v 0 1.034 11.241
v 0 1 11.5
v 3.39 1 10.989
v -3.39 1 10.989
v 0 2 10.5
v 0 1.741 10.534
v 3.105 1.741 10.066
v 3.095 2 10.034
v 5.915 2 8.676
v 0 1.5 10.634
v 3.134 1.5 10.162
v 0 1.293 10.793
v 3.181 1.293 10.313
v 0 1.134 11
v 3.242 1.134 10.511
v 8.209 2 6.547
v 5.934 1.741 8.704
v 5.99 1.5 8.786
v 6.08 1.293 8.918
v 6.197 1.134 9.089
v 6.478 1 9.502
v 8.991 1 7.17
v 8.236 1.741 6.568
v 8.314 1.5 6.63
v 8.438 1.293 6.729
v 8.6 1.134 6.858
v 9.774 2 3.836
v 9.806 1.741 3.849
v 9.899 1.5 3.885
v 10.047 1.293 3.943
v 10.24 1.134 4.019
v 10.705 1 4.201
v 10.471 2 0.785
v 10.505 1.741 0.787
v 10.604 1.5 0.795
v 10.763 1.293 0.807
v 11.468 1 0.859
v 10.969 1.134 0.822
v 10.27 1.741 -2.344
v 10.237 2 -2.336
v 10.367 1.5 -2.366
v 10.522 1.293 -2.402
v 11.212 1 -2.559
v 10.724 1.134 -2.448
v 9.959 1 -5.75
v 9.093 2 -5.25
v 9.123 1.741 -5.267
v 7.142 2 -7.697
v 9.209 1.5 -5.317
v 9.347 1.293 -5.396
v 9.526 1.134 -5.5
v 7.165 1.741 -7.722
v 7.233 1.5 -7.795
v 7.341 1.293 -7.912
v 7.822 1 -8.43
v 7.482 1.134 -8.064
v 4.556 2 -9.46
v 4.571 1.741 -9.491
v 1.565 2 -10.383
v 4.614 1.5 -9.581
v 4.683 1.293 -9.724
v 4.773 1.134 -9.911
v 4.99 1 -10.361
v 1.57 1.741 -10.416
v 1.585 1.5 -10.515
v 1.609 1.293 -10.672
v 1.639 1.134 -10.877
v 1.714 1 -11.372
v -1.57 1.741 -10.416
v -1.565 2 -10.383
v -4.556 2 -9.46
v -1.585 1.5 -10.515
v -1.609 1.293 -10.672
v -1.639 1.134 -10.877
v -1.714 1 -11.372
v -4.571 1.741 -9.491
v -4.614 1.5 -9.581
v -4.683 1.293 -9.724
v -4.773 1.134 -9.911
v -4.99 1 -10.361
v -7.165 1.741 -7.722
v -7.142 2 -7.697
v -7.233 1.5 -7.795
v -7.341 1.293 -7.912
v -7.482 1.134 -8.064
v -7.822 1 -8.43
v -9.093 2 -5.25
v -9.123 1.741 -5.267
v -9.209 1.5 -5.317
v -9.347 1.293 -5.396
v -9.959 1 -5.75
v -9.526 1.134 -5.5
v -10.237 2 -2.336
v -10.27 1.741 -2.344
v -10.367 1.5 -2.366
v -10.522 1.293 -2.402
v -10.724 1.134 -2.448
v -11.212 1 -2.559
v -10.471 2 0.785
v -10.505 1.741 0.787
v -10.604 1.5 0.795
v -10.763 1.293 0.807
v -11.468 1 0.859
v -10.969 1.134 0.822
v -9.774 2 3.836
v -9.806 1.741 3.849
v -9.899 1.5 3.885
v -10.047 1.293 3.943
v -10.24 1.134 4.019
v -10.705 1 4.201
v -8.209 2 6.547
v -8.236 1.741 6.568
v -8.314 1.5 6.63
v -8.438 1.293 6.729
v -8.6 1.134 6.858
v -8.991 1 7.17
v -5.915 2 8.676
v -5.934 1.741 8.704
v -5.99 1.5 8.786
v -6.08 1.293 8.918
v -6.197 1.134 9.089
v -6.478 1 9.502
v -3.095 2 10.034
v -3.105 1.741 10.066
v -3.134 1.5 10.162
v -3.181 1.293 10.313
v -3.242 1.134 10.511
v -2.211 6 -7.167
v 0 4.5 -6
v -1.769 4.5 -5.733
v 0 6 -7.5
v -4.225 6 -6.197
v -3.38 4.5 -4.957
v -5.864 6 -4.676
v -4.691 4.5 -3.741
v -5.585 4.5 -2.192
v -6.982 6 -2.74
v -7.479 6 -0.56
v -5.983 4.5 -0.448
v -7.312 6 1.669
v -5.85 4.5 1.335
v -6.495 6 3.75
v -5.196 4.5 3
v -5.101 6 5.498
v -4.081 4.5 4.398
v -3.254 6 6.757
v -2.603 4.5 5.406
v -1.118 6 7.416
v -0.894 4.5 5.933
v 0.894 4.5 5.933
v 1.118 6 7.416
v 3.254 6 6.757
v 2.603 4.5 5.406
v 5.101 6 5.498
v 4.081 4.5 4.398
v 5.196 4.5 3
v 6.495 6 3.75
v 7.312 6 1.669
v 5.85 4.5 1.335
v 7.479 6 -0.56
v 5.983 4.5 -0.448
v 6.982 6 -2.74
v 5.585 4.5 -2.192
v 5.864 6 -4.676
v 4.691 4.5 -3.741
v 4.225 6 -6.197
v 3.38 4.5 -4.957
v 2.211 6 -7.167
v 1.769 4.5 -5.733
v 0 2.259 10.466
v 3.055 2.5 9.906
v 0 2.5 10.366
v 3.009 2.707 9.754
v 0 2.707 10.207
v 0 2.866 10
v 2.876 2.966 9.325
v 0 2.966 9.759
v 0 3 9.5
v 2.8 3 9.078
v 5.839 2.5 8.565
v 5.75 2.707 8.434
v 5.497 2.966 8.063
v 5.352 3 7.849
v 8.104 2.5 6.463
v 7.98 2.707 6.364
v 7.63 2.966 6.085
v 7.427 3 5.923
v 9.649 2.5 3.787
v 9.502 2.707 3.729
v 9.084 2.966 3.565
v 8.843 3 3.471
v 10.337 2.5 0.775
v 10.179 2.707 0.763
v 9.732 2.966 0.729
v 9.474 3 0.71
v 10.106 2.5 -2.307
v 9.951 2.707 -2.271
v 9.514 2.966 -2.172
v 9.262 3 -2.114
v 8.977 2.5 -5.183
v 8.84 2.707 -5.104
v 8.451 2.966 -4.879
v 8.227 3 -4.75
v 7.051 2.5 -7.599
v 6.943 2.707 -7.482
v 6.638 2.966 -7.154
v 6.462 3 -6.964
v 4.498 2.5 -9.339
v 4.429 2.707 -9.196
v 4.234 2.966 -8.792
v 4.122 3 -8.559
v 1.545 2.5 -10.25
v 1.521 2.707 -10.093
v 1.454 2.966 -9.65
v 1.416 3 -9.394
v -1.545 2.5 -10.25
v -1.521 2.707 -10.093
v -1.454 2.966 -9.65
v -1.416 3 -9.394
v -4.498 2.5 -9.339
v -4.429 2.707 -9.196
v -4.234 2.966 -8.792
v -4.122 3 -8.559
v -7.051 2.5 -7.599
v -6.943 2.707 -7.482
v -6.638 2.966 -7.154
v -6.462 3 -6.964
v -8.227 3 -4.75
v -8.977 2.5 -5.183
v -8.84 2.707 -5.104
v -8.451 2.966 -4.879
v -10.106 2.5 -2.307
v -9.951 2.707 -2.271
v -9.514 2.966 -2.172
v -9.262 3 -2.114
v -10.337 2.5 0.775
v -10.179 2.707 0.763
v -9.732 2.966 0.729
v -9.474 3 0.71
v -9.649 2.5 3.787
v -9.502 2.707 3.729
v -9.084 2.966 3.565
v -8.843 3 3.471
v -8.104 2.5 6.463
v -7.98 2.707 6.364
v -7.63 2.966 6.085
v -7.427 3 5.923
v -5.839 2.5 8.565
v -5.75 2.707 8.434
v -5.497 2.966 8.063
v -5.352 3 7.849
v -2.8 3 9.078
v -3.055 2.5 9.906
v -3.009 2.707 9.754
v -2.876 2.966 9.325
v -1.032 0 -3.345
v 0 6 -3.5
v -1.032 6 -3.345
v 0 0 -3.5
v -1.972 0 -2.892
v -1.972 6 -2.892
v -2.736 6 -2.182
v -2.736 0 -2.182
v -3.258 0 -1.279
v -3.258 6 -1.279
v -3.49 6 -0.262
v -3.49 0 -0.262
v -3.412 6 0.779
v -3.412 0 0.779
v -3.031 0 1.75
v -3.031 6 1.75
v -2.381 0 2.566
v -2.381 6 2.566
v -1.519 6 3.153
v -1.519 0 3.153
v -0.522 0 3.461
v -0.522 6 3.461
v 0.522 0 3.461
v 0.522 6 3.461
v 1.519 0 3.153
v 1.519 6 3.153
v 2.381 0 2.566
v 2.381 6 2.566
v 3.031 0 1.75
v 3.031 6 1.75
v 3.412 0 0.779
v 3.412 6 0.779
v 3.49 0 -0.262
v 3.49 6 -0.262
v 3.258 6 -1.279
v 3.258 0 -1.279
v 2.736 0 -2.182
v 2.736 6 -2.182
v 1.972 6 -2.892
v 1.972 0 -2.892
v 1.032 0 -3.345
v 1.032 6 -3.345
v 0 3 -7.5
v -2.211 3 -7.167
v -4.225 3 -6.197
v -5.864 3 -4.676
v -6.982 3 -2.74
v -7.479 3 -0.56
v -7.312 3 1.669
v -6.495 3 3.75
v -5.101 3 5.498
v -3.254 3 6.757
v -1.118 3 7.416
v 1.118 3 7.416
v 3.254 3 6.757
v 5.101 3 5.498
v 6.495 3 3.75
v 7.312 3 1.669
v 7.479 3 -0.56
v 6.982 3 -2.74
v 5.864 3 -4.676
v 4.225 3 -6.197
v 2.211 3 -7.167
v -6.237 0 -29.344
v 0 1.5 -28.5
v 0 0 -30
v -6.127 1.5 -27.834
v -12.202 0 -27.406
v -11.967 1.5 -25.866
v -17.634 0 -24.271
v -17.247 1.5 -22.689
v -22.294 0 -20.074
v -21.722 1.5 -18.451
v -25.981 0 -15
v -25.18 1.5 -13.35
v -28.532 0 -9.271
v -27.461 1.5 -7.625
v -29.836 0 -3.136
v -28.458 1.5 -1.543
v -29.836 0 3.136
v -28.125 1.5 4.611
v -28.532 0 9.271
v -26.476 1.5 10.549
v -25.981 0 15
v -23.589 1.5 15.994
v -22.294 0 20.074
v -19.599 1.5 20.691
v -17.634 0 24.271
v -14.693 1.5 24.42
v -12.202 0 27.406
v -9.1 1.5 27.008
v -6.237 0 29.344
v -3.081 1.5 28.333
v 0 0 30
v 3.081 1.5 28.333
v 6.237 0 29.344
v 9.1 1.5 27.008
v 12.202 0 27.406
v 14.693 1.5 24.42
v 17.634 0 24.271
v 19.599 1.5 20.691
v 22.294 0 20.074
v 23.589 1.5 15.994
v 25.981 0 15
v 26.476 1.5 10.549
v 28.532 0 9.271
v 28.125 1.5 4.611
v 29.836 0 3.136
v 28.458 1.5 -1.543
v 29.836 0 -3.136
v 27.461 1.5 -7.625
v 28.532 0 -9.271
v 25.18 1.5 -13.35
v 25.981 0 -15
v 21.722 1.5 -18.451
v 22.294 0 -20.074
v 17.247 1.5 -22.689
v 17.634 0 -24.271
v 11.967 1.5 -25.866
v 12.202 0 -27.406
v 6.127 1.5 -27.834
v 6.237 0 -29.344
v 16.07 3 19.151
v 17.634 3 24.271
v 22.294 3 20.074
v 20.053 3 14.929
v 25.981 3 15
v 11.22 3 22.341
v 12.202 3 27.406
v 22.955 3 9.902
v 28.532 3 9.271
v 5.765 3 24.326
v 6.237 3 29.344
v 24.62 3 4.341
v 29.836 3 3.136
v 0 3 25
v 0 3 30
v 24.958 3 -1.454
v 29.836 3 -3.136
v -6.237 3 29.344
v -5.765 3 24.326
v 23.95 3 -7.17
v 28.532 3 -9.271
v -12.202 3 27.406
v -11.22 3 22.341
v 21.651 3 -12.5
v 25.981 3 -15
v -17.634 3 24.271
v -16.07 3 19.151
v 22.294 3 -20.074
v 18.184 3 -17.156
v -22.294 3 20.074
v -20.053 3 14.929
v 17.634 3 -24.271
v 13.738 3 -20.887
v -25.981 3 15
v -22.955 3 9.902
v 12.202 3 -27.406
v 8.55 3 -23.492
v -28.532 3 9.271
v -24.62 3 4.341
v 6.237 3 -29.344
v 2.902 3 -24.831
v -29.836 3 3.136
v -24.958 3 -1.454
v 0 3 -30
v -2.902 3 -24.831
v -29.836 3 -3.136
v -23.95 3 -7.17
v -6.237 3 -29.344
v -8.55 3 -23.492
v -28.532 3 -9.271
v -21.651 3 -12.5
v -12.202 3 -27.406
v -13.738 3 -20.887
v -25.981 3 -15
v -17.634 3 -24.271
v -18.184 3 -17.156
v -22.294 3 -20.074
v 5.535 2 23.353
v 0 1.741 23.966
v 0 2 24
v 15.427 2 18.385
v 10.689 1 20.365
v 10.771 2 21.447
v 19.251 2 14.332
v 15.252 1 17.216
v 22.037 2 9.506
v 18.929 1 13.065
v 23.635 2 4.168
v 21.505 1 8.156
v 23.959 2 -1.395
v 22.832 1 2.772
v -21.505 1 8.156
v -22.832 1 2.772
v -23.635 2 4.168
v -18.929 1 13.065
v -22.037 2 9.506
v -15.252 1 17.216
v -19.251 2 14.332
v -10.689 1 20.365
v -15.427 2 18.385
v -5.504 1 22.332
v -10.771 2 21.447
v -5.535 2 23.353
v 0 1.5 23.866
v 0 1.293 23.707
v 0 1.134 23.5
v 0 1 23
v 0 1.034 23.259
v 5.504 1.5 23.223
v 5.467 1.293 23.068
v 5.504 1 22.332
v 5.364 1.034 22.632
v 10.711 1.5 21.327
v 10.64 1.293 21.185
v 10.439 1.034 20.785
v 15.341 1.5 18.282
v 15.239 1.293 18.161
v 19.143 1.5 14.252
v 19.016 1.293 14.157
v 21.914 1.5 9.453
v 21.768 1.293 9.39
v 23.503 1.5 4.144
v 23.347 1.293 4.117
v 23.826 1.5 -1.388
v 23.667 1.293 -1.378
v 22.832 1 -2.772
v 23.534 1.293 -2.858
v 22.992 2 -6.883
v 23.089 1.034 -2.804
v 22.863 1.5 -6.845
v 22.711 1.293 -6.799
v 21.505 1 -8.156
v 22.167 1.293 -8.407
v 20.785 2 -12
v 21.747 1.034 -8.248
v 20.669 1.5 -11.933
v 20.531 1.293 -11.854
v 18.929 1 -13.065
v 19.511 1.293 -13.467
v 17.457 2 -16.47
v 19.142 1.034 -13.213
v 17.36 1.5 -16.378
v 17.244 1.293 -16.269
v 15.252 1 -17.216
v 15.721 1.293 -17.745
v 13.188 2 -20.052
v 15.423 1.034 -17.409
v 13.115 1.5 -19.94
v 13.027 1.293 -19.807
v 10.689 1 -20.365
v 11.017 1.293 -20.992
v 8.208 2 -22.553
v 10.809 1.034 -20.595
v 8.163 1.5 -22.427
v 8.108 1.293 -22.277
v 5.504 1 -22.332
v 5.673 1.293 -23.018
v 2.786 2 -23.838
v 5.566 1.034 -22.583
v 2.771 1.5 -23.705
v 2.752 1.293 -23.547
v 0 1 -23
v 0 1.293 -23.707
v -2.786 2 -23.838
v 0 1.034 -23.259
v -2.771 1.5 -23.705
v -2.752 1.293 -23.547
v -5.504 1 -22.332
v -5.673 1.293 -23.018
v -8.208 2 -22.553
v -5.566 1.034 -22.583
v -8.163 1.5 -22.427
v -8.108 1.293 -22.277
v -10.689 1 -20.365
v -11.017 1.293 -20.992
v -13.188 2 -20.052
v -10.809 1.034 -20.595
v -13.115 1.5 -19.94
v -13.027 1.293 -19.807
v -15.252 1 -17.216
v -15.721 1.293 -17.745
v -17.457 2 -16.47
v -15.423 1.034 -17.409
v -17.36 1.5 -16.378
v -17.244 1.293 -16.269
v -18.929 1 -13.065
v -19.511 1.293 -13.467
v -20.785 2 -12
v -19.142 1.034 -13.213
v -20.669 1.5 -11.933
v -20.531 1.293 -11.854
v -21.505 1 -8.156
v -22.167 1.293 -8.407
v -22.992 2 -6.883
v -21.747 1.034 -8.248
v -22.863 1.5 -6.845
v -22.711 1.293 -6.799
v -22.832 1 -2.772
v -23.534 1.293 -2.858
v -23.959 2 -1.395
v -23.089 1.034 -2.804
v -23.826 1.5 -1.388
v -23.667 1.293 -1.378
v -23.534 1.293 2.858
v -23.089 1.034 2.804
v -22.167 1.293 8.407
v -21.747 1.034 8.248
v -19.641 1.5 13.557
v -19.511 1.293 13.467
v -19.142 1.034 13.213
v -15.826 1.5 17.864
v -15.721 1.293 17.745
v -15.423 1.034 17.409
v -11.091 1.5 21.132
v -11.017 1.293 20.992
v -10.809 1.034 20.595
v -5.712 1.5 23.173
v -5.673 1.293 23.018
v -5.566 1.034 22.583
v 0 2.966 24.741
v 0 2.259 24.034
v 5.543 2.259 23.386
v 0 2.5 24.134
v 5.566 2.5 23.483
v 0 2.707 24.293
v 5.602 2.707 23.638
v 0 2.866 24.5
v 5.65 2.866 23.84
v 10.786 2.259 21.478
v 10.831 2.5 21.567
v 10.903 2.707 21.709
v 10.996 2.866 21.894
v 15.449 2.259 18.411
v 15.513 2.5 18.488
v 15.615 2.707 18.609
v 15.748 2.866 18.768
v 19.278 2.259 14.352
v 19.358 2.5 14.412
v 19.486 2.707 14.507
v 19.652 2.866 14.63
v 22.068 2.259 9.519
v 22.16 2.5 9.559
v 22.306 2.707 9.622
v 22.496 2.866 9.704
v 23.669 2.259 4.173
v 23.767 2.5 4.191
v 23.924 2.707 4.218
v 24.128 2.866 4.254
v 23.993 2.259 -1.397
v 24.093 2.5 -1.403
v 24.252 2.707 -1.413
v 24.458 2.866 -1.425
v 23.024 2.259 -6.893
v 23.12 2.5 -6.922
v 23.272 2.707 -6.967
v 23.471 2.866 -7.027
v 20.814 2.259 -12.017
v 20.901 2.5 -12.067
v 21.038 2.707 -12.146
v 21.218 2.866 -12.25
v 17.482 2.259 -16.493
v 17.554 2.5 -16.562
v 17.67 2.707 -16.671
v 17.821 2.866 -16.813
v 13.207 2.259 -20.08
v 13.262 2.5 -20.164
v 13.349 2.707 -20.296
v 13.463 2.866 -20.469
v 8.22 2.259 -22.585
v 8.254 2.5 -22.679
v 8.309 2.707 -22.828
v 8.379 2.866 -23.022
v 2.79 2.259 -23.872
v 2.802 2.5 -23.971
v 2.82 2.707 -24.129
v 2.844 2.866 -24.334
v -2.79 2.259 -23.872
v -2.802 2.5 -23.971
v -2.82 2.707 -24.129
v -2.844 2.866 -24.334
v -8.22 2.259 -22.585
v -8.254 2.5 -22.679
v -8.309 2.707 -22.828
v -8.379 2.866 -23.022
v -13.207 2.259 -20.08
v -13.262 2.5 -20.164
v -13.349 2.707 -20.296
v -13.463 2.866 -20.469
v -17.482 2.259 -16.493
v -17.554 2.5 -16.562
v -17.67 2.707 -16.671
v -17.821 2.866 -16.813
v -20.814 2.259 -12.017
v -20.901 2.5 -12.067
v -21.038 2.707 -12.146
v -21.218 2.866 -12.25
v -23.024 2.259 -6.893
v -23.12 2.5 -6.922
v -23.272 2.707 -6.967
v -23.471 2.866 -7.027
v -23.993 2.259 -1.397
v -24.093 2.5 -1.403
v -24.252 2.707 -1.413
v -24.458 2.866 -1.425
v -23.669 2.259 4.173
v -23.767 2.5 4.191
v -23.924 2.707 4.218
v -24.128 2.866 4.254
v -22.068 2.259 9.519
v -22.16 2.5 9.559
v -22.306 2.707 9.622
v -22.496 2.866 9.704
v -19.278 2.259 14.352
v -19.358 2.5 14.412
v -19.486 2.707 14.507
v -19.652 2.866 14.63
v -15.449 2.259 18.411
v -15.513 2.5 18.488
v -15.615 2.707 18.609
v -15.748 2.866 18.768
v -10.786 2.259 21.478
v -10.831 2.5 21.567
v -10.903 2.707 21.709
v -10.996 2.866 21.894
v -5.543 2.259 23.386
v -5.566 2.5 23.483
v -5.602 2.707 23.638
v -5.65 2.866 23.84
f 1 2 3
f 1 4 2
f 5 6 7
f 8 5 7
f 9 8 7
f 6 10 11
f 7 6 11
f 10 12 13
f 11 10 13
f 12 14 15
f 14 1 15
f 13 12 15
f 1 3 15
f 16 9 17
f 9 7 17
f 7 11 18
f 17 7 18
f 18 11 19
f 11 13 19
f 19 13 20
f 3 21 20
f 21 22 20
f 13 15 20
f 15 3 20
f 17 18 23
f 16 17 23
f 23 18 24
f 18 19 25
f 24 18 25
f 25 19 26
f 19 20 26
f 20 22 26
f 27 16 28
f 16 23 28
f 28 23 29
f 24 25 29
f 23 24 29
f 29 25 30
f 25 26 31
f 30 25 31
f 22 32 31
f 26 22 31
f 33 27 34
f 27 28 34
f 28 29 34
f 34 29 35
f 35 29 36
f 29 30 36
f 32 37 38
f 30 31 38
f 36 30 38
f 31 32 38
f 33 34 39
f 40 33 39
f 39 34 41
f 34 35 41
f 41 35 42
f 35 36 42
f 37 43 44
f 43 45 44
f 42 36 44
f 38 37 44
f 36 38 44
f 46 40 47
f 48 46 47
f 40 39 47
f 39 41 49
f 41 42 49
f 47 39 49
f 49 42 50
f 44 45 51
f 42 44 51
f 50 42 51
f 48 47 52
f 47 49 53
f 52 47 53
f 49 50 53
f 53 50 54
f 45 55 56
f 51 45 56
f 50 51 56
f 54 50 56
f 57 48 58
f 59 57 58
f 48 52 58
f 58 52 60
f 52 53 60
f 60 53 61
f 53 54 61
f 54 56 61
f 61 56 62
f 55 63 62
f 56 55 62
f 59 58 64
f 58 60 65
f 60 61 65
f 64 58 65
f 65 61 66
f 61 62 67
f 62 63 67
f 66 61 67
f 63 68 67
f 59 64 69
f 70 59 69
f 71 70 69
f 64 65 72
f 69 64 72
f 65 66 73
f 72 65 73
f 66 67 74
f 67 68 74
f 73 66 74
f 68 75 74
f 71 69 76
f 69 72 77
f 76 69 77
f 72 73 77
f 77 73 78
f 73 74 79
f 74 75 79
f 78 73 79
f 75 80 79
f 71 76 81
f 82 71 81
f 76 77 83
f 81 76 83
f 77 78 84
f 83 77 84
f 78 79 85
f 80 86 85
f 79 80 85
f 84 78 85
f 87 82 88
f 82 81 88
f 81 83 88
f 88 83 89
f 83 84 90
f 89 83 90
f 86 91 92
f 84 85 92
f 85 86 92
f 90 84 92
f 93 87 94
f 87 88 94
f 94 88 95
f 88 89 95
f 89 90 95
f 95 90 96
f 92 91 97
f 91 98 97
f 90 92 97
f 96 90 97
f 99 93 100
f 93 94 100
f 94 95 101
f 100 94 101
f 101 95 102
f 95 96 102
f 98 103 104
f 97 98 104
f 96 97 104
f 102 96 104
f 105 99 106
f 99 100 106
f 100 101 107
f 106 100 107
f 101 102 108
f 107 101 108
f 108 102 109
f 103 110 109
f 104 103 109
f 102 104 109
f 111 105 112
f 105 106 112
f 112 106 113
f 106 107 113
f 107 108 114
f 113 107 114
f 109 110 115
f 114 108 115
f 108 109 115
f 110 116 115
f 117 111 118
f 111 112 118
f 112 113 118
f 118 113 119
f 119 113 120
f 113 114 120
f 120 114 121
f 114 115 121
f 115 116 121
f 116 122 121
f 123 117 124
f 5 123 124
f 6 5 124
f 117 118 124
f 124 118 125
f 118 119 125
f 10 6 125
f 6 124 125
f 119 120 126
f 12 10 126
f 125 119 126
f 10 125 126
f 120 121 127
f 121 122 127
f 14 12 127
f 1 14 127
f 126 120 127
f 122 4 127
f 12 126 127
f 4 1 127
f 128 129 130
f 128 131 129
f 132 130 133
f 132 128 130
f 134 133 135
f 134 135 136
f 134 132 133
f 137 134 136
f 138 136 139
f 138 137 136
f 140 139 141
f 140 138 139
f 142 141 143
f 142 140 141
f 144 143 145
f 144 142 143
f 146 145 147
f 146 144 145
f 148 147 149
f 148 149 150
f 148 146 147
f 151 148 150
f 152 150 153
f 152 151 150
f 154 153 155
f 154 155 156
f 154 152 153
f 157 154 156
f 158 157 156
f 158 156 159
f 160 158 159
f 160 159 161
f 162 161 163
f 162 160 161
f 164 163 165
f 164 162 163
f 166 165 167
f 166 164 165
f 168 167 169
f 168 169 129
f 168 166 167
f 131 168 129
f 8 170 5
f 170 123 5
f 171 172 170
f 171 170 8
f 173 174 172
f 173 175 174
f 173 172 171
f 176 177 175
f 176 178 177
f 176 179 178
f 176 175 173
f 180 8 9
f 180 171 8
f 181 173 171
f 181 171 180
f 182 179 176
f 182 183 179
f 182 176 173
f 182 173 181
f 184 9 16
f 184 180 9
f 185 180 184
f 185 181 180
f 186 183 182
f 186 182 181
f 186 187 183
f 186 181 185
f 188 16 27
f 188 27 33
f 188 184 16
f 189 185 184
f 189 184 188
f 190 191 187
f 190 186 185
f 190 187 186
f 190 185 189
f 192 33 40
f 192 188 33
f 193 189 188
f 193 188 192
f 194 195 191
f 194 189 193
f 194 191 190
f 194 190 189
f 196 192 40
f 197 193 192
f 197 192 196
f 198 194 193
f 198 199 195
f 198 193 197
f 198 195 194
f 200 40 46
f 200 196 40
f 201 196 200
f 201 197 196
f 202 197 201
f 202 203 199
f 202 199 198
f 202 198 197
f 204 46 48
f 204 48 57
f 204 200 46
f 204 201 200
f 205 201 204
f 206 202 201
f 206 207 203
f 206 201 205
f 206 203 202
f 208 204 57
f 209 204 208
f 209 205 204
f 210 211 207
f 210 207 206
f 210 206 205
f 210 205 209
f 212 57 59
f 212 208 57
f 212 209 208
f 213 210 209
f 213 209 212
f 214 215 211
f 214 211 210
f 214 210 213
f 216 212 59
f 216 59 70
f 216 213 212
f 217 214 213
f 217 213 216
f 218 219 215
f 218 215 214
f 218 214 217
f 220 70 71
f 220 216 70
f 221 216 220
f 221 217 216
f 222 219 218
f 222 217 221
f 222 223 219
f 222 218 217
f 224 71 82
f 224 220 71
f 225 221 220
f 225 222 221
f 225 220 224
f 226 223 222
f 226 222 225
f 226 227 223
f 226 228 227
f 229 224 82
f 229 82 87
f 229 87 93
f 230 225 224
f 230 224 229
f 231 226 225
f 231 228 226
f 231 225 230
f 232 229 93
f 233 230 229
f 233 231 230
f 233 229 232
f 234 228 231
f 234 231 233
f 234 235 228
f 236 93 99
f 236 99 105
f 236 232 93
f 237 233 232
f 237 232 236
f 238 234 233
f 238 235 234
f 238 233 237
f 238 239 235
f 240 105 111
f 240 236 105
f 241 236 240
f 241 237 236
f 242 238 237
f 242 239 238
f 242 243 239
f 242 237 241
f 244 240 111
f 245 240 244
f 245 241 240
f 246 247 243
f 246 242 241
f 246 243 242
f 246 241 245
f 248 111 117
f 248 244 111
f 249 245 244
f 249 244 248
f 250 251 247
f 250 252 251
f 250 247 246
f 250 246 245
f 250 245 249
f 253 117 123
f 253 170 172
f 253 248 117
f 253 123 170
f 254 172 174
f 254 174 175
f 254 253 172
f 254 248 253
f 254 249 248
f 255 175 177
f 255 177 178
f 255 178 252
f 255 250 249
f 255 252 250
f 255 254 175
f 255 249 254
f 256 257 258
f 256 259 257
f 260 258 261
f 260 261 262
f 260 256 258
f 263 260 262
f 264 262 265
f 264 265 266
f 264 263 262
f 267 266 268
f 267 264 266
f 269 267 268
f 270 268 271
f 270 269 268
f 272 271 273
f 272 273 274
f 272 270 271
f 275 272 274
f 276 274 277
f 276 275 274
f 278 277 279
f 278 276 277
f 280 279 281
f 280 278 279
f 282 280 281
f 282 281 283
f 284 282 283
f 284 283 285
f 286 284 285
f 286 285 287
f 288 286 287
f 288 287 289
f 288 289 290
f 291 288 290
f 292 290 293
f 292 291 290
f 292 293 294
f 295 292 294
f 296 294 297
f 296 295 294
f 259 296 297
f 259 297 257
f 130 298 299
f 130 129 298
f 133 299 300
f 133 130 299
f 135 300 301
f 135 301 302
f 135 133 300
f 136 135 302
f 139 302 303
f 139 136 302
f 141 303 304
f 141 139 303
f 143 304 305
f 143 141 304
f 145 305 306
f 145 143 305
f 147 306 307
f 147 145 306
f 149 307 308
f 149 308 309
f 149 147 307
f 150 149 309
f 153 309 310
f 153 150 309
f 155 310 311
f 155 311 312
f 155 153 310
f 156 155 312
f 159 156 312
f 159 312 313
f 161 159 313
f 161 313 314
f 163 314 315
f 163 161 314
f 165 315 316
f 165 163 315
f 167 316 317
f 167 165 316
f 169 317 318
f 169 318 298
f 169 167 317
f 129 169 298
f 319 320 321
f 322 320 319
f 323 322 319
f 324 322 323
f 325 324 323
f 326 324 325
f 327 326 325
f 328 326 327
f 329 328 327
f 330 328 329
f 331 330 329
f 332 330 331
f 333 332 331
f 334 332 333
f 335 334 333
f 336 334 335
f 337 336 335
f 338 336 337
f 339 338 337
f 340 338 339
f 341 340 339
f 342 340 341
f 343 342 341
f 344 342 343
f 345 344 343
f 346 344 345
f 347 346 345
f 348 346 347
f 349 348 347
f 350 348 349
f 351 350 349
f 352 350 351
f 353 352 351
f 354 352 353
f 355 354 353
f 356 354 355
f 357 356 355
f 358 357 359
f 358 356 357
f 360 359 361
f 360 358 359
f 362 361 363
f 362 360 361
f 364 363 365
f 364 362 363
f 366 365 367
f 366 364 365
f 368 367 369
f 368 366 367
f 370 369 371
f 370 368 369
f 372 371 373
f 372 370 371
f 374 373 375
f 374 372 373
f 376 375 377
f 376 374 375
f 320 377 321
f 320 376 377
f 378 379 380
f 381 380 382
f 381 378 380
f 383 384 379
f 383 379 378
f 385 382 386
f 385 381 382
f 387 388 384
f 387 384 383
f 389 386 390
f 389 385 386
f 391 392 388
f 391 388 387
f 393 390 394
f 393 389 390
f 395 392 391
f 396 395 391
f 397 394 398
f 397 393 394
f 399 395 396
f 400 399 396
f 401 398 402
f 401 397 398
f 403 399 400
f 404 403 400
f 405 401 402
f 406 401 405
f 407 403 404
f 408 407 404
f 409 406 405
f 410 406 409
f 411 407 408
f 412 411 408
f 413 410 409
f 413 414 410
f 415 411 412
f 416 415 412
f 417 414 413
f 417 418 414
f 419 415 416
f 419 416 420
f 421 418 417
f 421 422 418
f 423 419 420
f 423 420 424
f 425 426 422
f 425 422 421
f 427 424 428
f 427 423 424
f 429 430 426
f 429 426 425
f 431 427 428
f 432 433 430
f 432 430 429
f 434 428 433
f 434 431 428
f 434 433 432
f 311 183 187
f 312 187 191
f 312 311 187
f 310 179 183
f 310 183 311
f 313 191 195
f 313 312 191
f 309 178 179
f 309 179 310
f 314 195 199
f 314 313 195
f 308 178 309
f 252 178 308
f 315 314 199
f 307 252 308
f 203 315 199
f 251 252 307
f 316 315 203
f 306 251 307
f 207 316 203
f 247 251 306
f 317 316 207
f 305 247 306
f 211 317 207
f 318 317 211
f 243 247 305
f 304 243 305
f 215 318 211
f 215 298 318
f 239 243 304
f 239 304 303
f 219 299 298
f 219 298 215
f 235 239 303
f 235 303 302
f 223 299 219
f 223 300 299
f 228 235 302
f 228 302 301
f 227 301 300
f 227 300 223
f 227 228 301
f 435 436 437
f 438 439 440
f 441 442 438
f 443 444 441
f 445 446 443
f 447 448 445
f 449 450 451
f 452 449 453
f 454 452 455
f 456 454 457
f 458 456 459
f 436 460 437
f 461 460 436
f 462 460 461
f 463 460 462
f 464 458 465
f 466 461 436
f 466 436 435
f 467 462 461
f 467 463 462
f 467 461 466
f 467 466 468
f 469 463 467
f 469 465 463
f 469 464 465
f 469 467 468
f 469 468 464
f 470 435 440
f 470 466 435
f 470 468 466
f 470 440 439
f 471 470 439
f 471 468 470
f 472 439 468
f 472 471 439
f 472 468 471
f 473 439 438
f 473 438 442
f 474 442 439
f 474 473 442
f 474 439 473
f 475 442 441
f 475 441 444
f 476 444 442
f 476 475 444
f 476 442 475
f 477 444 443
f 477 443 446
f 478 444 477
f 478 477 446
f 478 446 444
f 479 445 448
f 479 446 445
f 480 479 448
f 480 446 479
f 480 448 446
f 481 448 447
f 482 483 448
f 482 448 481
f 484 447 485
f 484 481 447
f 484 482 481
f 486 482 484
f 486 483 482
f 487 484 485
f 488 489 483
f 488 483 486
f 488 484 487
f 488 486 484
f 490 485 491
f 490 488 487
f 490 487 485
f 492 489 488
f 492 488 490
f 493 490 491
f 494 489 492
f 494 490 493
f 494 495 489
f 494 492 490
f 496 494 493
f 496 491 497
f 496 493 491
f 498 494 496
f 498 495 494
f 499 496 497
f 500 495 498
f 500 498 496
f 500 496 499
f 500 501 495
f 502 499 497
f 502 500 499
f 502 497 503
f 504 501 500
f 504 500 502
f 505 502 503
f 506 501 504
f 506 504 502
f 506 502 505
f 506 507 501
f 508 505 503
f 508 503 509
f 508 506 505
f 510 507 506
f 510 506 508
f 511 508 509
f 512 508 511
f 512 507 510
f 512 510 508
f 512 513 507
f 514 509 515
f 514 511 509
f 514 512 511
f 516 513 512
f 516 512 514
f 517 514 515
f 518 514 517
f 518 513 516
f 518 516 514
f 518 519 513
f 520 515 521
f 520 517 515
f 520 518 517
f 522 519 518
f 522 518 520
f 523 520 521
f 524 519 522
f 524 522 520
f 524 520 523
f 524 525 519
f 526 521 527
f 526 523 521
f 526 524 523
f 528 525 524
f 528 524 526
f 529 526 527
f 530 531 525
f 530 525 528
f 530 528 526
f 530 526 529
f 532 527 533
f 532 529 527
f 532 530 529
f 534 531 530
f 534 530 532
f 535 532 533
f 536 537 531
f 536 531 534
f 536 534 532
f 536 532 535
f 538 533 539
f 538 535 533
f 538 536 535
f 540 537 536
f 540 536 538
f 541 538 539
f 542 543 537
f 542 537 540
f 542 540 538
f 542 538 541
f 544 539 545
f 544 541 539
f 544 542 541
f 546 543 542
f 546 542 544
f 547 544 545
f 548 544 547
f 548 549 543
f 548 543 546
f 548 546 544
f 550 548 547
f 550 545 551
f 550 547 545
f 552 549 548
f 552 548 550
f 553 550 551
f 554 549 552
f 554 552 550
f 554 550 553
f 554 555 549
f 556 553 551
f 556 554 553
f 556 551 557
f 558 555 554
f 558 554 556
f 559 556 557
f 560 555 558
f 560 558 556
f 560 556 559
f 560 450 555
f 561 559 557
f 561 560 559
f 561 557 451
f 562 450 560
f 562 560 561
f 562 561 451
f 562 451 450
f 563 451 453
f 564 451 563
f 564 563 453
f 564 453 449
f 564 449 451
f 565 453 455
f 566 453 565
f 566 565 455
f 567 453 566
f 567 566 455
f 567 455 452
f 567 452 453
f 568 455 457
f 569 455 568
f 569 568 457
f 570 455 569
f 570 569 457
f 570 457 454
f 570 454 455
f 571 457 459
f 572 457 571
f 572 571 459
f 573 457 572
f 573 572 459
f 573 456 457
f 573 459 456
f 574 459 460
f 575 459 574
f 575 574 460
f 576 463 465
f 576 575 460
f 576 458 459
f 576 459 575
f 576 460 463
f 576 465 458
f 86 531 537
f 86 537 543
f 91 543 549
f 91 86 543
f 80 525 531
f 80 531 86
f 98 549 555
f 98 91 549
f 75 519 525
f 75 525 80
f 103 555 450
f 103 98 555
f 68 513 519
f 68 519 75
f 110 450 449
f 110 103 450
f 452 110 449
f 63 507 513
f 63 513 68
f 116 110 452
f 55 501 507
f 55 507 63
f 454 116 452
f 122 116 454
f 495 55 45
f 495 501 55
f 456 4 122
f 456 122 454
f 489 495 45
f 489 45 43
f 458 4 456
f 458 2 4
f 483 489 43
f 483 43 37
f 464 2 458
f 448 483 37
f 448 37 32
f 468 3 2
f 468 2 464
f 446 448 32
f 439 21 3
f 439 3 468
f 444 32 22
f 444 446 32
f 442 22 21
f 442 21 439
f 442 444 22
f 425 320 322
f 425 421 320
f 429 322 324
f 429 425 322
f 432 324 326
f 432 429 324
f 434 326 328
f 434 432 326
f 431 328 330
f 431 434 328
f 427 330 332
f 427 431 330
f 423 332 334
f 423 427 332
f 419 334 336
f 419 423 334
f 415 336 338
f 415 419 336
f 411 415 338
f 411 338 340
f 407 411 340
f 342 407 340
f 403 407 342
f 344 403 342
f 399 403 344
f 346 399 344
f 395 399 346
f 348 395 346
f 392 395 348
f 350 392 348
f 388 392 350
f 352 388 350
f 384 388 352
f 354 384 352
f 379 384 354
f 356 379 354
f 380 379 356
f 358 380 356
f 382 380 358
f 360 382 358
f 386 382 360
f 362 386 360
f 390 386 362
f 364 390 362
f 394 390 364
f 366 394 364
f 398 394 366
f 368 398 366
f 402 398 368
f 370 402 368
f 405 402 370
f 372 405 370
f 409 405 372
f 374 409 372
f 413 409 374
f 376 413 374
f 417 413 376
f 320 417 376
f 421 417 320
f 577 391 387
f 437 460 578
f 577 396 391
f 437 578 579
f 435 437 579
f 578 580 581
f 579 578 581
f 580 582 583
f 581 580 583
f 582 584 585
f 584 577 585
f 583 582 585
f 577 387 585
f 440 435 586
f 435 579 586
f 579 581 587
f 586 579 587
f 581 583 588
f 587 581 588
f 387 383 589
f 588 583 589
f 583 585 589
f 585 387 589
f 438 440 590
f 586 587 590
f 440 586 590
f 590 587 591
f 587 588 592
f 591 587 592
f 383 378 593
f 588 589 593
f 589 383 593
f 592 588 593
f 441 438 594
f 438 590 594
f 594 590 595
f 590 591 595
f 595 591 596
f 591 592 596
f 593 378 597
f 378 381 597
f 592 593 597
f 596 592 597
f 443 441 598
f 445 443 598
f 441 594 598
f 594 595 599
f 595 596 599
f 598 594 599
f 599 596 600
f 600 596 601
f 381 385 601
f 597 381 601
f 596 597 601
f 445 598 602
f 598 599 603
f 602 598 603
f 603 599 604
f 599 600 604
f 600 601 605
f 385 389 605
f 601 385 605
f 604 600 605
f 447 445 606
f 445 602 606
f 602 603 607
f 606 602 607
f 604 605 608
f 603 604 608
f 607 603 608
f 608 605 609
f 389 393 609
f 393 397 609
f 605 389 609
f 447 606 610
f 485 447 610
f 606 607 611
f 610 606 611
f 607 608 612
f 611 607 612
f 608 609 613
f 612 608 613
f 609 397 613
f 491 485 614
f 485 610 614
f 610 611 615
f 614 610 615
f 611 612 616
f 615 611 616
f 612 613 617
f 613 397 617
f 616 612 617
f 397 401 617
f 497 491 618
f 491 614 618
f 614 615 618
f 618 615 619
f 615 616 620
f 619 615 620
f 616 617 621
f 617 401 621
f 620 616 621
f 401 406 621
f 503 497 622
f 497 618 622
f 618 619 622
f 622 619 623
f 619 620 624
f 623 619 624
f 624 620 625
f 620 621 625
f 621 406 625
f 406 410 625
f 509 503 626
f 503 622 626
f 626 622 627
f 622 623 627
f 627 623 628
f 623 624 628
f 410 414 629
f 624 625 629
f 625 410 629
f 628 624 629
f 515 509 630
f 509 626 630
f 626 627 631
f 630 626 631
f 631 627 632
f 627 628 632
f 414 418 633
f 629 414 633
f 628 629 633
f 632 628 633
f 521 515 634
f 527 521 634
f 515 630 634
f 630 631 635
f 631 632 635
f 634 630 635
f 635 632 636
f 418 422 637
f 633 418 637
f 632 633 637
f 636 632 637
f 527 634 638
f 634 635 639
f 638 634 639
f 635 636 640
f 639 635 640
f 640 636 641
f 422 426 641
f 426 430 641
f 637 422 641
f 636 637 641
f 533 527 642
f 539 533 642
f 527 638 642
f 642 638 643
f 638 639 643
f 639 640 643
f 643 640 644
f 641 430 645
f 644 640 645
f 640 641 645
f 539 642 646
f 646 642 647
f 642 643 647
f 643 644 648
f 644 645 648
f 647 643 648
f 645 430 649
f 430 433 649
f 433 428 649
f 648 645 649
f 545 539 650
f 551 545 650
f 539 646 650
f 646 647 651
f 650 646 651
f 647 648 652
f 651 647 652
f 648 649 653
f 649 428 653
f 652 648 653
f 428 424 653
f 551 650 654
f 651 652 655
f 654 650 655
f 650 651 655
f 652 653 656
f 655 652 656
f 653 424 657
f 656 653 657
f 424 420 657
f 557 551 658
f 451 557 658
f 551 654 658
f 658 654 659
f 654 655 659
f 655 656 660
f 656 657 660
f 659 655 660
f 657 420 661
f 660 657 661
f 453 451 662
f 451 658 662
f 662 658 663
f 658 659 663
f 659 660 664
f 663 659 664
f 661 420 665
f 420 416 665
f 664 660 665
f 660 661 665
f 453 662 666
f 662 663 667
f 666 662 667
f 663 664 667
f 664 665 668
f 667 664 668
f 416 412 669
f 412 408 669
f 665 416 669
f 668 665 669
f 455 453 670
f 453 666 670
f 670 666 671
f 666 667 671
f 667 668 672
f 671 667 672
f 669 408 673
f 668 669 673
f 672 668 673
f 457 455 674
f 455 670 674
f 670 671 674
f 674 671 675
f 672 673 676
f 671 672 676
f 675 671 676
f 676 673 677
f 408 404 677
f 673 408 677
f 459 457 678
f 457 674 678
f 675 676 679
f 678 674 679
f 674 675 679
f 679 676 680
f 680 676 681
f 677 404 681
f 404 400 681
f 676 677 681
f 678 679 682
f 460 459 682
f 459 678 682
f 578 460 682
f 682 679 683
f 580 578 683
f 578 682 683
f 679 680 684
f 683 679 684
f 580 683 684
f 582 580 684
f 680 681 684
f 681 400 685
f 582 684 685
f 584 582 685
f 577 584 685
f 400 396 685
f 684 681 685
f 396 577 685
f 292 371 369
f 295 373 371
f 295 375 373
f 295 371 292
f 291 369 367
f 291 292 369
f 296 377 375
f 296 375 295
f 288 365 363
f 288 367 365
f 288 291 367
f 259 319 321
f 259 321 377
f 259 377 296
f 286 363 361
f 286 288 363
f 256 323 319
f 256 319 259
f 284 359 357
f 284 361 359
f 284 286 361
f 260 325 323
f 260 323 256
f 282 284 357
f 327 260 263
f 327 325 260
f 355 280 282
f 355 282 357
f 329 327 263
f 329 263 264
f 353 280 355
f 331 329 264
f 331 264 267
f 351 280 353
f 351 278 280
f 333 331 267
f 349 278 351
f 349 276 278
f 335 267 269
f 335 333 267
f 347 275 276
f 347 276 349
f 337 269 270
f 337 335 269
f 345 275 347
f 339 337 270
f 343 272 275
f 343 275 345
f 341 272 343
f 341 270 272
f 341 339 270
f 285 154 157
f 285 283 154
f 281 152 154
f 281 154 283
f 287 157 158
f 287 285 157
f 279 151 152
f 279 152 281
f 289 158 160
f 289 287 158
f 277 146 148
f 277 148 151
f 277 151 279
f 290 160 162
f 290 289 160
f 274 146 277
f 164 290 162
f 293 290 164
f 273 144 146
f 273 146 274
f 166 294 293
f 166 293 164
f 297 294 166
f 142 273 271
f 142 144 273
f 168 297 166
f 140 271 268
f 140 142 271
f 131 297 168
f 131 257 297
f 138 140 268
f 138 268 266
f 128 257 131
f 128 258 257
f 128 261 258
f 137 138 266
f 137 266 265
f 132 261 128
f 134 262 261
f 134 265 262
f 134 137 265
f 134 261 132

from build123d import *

# Parameters (mm, degrees)
SKETCH2_R          = 24
SKETCH2_R_2        = 10.5
CUT_EXTRUDE1_DEPTH = 2
FILLET1_R          = 1


with BuildPart() as part:
    # Sketch1 → Revolve1 (revolve)
    with BuildSketch(Plane.XY, mode=Mode.PRIVATE) as revolve1_sk:
        Polygon((-3.5, 6), (-3.5, 0), (-30, 0), (-28.5, 1.5), (-30, 3), (-7.5, 3), (-6, 4.5), (-7.5, 6), align=None)
    revolve(revolve1_sk.sketch.rotate(Axis((0, 0, 0), (0, 1, 0)), 270), axis=Axis((0, 0, 0), (0, 1, 0)))

    # Sketch2 → Cut-Extrude1 (cut)
    with BuildSketch(Plane(origin=(0, 3, 0), x_dir=(1, 0, 0), z_dir=(0, 1, 0))):
        with Locations(Location((0, 0, 0), (0, 0, 270))):
            Circle(SKETCH2_R)
        with Locations(Location((0, 0, 0), (0, 0, 270))):
            Circle(SKETCH2_R_2, mode=Mode.SUBTRACT)
    extrude(amount=-CUT_EXTRUDE1_DEPTH, mode=Mode.SUBTRACT)

    # Fillet1
    fillet1_edges = [part.edges().sort_by_distance(p)[0] for p in [
        (0, 1, -10.5),
        (0, 1, -24),
    ]]
    fillet(fillet1_edges, radius=FILLET1_R)
    fillet1_2_edges = [part.edges().sort_by_distance(p)[0] for p in [
        (0, 3, -24),
        (0, 3, -10.5),
    ]]
    fillet(fillet1_2_edges, radius=FILLET1_R - 0.0001)  # a hair under: the kernel refuses the full size


solid = part.part
